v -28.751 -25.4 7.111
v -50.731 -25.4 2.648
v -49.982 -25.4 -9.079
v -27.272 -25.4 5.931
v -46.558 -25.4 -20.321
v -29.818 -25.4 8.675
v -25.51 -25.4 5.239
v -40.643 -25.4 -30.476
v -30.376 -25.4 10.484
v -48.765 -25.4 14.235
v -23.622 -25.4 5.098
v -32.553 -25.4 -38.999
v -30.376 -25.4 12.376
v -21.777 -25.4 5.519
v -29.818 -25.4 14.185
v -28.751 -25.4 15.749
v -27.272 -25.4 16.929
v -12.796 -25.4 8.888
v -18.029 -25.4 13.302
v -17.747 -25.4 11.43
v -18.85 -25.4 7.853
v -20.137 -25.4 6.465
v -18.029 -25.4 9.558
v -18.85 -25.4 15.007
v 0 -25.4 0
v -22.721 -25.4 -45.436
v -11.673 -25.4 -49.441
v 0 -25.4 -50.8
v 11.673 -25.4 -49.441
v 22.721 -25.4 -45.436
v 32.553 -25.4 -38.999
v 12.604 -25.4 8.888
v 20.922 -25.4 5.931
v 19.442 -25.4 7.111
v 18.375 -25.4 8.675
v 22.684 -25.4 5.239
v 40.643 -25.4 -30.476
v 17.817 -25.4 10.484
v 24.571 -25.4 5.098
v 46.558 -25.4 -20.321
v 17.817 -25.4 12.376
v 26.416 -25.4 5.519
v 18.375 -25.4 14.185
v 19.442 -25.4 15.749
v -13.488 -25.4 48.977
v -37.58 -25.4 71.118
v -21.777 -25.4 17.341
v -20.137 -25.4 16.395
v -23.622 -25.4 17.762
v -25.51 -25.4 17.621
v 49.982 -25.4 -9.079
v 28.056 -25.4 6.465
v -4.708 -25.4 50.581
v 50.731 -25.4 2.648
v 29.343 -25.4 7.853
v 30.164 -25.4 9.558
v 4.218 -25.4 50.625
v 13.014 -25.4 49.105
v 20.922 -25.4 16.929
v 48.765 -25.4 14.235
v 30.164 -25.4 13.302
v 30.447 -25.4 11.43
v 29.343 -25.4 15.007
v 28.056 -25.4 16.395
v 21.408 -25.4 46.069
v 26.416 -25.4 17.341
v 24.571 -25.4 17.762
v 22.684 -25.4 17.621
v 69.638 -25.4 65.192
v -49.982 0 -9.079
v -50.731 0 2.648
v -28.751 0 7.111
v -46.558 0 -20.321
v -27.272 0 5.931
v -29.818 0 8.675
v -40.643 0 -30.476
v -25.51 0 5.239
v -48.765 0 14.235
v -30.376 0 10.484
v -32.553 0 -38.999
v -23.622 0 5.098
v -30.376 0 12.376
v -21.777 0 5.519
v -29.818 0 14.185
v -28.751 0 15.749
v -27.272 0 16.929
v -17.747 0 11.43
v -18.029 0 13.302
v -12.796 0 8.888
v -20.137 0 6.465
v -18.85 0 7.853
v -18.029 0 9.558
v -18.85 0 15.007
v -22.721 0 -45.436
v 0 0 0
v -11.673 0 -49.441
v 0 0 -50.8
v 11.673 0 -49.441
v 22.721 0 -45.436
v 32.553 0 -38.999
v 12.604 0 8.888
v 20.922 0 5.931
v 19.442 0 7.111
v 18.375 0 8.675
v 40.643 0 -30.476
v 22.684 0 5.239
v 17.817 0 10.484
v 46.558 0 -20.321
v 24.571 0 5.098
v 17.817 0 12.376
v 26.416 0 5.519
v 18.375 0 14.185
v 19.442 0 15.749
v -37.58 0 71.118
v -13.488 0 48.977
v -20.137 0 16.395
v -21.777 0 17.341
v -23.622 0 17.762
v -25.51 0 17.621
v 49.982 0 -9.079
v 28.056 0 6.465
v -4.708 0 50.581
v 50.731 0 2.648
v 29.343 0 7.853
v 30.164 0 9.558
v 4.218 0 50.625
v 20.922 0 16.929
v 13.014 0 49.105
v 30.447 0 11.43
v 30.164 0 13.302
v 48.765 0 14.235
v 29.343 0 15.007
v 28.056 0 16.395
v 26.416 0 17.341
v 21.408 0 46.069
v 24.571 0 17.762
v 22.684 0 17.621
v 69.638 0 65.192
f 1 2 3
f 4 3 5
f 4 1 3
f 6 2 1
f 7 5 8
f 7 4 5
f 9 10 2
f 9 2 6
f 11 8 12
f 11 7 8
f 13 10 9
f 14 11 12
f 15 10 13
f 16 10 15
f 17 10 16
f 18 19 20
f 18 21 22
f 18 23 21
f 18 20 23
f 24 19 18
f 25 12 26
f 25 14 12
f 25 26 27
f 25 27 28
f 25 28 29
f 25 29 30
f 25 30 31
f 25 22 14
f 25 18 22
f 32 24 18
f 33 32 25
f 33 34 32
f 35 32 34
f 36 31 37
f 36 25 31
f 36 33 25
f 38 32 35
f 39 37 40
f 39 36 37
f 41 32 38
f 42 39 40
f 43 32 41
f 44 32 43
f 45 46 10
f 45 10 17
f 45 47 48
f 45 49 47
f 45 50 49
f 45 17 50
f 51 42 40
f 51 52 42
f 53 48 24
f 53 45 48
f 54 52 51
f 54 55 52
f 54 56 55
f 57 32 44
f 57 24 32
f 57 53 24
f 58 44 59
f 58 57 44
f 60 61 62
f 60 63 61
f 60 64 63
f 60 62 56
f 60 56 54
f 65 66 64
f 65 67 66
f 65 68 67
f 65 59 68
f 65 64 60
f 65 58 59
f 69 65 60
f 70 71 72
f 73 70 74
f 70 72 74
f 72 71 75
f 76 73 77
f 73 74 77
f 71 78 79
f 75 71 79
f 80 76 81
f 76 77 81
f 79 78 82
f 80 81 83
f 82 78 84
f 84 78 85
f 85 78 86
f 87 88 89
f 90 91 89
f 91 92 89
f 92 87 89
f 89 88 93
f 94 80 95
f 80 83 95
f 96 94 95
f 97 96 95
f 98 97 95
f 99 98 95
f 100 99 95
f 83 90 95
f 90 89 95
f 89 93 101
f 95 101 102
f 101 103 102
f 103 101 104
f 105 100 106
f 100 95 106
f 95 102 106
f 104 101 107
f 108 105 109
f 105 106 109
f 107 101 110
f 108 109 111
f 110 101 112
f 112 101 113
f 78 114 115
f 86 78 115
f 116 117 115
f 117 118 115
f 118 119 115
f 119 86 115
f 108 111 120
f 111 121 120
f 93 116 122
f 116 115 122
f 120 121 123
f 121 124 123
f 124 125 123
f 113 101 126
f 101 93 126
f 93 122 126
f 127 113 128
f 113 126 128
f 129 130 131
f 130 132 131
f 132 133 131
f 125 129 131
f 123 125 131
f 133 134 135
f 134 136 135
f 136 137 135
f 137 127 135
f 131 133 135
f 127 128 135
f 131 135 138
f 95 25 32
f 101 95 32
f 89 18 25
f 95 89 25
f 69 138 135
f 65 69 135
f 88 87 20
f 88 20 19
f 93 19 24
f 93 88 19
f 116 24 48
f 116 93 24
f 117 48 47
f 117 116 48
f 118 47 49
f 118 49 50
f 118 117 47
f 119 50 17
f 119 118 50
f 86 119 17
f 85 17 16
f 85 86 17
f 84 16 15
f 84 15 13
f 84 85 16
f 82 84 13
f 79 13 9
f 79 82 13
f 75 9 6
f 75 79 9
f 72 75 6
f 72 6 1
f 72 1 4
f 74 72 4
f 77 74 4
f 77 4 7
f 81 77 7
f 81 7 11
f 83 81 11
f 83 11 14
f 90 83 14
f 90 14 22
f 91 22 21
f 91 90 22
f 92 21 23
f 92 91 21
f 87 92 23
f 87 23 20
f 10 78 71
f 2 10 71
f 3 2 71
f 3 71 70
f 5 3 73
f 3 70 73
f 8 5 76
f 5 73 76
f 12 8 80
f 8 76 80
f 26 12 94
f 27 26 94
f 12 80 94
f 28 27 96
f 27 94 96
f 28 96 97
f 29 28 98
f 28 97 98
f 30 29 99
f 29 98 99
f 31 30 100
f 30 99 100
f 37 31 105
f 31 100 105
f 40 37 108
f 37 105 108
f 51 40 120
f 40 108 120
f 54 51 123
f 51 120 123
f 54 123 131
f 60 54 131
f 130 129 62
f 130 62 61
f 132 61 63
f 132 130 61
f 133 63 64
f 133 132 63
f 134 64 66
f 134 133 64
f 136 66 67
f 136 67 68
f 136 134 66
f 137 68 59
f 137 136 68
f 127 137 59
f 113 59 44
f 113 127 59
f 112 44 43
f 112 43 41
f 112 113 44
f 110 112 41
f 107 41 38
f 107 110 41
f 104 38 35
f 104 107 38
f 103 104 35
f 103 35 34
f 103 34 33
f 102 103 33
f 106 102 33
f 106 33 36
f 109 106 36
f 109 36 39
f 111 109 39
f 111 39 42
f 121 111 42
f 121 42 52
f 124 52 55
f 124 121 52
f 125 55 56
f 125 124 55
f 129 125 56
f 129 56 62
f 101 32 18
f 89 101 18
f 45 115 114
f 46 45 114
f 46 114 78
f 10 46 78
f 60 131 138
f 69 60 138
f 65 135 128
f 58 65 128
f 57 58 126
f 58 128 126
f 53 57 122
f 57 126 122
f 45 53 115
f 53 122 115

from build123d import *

# Parameters (mm, degrees)
F0_R     = 6.35
F1_DEPTH = 25.4
F3_DEPTH = 25.401


with BuildPart() as f1:
    # F0 (on Front) → F1 (new body)
    with BuildSketch(Plane.XZ):
        with BuildLine():
            Line((-37.580457, 71.118474), (-48.764932, 14.234516))
            ThreePointArc((-48.764932, 14.234516), (0, -50.8), (48.764932, 14.234516))
            Line((48.764932, 14.234516), (69.638334, 65.191805))
            Line((69.638334, 65.191805), (21.407981, 46.068844))
            ThreePointArc((21.407981, 46.068844), (4.218409, 50.62455), (-13.488094, 48.97664))
            Line((-13.488094, 48.97664), (-37.580457, 71.118474))
        make_face()
        with Locations((-24.096556, 11.43)):
            Circle(F0_R, mode=Mode.SUBTRACT)
        with Locations((24.096556, 11.43)):
            Circle(F0_R, mode=Mode.SUBTRACT)
    extrude(amount=F1_DEPTH)

    # F2 (on face) → F3 (cut, through all)
    with BuildSketch(Plane.XZ.offset(25.4)):
        Polygon((12.603787, 8.888469), (-12.796213, 8.888469), (0, 0), align=None)
    extrude(amount=-F3_DEPTH, mode=Mode.SUBTRACT)


solid = f1.part
